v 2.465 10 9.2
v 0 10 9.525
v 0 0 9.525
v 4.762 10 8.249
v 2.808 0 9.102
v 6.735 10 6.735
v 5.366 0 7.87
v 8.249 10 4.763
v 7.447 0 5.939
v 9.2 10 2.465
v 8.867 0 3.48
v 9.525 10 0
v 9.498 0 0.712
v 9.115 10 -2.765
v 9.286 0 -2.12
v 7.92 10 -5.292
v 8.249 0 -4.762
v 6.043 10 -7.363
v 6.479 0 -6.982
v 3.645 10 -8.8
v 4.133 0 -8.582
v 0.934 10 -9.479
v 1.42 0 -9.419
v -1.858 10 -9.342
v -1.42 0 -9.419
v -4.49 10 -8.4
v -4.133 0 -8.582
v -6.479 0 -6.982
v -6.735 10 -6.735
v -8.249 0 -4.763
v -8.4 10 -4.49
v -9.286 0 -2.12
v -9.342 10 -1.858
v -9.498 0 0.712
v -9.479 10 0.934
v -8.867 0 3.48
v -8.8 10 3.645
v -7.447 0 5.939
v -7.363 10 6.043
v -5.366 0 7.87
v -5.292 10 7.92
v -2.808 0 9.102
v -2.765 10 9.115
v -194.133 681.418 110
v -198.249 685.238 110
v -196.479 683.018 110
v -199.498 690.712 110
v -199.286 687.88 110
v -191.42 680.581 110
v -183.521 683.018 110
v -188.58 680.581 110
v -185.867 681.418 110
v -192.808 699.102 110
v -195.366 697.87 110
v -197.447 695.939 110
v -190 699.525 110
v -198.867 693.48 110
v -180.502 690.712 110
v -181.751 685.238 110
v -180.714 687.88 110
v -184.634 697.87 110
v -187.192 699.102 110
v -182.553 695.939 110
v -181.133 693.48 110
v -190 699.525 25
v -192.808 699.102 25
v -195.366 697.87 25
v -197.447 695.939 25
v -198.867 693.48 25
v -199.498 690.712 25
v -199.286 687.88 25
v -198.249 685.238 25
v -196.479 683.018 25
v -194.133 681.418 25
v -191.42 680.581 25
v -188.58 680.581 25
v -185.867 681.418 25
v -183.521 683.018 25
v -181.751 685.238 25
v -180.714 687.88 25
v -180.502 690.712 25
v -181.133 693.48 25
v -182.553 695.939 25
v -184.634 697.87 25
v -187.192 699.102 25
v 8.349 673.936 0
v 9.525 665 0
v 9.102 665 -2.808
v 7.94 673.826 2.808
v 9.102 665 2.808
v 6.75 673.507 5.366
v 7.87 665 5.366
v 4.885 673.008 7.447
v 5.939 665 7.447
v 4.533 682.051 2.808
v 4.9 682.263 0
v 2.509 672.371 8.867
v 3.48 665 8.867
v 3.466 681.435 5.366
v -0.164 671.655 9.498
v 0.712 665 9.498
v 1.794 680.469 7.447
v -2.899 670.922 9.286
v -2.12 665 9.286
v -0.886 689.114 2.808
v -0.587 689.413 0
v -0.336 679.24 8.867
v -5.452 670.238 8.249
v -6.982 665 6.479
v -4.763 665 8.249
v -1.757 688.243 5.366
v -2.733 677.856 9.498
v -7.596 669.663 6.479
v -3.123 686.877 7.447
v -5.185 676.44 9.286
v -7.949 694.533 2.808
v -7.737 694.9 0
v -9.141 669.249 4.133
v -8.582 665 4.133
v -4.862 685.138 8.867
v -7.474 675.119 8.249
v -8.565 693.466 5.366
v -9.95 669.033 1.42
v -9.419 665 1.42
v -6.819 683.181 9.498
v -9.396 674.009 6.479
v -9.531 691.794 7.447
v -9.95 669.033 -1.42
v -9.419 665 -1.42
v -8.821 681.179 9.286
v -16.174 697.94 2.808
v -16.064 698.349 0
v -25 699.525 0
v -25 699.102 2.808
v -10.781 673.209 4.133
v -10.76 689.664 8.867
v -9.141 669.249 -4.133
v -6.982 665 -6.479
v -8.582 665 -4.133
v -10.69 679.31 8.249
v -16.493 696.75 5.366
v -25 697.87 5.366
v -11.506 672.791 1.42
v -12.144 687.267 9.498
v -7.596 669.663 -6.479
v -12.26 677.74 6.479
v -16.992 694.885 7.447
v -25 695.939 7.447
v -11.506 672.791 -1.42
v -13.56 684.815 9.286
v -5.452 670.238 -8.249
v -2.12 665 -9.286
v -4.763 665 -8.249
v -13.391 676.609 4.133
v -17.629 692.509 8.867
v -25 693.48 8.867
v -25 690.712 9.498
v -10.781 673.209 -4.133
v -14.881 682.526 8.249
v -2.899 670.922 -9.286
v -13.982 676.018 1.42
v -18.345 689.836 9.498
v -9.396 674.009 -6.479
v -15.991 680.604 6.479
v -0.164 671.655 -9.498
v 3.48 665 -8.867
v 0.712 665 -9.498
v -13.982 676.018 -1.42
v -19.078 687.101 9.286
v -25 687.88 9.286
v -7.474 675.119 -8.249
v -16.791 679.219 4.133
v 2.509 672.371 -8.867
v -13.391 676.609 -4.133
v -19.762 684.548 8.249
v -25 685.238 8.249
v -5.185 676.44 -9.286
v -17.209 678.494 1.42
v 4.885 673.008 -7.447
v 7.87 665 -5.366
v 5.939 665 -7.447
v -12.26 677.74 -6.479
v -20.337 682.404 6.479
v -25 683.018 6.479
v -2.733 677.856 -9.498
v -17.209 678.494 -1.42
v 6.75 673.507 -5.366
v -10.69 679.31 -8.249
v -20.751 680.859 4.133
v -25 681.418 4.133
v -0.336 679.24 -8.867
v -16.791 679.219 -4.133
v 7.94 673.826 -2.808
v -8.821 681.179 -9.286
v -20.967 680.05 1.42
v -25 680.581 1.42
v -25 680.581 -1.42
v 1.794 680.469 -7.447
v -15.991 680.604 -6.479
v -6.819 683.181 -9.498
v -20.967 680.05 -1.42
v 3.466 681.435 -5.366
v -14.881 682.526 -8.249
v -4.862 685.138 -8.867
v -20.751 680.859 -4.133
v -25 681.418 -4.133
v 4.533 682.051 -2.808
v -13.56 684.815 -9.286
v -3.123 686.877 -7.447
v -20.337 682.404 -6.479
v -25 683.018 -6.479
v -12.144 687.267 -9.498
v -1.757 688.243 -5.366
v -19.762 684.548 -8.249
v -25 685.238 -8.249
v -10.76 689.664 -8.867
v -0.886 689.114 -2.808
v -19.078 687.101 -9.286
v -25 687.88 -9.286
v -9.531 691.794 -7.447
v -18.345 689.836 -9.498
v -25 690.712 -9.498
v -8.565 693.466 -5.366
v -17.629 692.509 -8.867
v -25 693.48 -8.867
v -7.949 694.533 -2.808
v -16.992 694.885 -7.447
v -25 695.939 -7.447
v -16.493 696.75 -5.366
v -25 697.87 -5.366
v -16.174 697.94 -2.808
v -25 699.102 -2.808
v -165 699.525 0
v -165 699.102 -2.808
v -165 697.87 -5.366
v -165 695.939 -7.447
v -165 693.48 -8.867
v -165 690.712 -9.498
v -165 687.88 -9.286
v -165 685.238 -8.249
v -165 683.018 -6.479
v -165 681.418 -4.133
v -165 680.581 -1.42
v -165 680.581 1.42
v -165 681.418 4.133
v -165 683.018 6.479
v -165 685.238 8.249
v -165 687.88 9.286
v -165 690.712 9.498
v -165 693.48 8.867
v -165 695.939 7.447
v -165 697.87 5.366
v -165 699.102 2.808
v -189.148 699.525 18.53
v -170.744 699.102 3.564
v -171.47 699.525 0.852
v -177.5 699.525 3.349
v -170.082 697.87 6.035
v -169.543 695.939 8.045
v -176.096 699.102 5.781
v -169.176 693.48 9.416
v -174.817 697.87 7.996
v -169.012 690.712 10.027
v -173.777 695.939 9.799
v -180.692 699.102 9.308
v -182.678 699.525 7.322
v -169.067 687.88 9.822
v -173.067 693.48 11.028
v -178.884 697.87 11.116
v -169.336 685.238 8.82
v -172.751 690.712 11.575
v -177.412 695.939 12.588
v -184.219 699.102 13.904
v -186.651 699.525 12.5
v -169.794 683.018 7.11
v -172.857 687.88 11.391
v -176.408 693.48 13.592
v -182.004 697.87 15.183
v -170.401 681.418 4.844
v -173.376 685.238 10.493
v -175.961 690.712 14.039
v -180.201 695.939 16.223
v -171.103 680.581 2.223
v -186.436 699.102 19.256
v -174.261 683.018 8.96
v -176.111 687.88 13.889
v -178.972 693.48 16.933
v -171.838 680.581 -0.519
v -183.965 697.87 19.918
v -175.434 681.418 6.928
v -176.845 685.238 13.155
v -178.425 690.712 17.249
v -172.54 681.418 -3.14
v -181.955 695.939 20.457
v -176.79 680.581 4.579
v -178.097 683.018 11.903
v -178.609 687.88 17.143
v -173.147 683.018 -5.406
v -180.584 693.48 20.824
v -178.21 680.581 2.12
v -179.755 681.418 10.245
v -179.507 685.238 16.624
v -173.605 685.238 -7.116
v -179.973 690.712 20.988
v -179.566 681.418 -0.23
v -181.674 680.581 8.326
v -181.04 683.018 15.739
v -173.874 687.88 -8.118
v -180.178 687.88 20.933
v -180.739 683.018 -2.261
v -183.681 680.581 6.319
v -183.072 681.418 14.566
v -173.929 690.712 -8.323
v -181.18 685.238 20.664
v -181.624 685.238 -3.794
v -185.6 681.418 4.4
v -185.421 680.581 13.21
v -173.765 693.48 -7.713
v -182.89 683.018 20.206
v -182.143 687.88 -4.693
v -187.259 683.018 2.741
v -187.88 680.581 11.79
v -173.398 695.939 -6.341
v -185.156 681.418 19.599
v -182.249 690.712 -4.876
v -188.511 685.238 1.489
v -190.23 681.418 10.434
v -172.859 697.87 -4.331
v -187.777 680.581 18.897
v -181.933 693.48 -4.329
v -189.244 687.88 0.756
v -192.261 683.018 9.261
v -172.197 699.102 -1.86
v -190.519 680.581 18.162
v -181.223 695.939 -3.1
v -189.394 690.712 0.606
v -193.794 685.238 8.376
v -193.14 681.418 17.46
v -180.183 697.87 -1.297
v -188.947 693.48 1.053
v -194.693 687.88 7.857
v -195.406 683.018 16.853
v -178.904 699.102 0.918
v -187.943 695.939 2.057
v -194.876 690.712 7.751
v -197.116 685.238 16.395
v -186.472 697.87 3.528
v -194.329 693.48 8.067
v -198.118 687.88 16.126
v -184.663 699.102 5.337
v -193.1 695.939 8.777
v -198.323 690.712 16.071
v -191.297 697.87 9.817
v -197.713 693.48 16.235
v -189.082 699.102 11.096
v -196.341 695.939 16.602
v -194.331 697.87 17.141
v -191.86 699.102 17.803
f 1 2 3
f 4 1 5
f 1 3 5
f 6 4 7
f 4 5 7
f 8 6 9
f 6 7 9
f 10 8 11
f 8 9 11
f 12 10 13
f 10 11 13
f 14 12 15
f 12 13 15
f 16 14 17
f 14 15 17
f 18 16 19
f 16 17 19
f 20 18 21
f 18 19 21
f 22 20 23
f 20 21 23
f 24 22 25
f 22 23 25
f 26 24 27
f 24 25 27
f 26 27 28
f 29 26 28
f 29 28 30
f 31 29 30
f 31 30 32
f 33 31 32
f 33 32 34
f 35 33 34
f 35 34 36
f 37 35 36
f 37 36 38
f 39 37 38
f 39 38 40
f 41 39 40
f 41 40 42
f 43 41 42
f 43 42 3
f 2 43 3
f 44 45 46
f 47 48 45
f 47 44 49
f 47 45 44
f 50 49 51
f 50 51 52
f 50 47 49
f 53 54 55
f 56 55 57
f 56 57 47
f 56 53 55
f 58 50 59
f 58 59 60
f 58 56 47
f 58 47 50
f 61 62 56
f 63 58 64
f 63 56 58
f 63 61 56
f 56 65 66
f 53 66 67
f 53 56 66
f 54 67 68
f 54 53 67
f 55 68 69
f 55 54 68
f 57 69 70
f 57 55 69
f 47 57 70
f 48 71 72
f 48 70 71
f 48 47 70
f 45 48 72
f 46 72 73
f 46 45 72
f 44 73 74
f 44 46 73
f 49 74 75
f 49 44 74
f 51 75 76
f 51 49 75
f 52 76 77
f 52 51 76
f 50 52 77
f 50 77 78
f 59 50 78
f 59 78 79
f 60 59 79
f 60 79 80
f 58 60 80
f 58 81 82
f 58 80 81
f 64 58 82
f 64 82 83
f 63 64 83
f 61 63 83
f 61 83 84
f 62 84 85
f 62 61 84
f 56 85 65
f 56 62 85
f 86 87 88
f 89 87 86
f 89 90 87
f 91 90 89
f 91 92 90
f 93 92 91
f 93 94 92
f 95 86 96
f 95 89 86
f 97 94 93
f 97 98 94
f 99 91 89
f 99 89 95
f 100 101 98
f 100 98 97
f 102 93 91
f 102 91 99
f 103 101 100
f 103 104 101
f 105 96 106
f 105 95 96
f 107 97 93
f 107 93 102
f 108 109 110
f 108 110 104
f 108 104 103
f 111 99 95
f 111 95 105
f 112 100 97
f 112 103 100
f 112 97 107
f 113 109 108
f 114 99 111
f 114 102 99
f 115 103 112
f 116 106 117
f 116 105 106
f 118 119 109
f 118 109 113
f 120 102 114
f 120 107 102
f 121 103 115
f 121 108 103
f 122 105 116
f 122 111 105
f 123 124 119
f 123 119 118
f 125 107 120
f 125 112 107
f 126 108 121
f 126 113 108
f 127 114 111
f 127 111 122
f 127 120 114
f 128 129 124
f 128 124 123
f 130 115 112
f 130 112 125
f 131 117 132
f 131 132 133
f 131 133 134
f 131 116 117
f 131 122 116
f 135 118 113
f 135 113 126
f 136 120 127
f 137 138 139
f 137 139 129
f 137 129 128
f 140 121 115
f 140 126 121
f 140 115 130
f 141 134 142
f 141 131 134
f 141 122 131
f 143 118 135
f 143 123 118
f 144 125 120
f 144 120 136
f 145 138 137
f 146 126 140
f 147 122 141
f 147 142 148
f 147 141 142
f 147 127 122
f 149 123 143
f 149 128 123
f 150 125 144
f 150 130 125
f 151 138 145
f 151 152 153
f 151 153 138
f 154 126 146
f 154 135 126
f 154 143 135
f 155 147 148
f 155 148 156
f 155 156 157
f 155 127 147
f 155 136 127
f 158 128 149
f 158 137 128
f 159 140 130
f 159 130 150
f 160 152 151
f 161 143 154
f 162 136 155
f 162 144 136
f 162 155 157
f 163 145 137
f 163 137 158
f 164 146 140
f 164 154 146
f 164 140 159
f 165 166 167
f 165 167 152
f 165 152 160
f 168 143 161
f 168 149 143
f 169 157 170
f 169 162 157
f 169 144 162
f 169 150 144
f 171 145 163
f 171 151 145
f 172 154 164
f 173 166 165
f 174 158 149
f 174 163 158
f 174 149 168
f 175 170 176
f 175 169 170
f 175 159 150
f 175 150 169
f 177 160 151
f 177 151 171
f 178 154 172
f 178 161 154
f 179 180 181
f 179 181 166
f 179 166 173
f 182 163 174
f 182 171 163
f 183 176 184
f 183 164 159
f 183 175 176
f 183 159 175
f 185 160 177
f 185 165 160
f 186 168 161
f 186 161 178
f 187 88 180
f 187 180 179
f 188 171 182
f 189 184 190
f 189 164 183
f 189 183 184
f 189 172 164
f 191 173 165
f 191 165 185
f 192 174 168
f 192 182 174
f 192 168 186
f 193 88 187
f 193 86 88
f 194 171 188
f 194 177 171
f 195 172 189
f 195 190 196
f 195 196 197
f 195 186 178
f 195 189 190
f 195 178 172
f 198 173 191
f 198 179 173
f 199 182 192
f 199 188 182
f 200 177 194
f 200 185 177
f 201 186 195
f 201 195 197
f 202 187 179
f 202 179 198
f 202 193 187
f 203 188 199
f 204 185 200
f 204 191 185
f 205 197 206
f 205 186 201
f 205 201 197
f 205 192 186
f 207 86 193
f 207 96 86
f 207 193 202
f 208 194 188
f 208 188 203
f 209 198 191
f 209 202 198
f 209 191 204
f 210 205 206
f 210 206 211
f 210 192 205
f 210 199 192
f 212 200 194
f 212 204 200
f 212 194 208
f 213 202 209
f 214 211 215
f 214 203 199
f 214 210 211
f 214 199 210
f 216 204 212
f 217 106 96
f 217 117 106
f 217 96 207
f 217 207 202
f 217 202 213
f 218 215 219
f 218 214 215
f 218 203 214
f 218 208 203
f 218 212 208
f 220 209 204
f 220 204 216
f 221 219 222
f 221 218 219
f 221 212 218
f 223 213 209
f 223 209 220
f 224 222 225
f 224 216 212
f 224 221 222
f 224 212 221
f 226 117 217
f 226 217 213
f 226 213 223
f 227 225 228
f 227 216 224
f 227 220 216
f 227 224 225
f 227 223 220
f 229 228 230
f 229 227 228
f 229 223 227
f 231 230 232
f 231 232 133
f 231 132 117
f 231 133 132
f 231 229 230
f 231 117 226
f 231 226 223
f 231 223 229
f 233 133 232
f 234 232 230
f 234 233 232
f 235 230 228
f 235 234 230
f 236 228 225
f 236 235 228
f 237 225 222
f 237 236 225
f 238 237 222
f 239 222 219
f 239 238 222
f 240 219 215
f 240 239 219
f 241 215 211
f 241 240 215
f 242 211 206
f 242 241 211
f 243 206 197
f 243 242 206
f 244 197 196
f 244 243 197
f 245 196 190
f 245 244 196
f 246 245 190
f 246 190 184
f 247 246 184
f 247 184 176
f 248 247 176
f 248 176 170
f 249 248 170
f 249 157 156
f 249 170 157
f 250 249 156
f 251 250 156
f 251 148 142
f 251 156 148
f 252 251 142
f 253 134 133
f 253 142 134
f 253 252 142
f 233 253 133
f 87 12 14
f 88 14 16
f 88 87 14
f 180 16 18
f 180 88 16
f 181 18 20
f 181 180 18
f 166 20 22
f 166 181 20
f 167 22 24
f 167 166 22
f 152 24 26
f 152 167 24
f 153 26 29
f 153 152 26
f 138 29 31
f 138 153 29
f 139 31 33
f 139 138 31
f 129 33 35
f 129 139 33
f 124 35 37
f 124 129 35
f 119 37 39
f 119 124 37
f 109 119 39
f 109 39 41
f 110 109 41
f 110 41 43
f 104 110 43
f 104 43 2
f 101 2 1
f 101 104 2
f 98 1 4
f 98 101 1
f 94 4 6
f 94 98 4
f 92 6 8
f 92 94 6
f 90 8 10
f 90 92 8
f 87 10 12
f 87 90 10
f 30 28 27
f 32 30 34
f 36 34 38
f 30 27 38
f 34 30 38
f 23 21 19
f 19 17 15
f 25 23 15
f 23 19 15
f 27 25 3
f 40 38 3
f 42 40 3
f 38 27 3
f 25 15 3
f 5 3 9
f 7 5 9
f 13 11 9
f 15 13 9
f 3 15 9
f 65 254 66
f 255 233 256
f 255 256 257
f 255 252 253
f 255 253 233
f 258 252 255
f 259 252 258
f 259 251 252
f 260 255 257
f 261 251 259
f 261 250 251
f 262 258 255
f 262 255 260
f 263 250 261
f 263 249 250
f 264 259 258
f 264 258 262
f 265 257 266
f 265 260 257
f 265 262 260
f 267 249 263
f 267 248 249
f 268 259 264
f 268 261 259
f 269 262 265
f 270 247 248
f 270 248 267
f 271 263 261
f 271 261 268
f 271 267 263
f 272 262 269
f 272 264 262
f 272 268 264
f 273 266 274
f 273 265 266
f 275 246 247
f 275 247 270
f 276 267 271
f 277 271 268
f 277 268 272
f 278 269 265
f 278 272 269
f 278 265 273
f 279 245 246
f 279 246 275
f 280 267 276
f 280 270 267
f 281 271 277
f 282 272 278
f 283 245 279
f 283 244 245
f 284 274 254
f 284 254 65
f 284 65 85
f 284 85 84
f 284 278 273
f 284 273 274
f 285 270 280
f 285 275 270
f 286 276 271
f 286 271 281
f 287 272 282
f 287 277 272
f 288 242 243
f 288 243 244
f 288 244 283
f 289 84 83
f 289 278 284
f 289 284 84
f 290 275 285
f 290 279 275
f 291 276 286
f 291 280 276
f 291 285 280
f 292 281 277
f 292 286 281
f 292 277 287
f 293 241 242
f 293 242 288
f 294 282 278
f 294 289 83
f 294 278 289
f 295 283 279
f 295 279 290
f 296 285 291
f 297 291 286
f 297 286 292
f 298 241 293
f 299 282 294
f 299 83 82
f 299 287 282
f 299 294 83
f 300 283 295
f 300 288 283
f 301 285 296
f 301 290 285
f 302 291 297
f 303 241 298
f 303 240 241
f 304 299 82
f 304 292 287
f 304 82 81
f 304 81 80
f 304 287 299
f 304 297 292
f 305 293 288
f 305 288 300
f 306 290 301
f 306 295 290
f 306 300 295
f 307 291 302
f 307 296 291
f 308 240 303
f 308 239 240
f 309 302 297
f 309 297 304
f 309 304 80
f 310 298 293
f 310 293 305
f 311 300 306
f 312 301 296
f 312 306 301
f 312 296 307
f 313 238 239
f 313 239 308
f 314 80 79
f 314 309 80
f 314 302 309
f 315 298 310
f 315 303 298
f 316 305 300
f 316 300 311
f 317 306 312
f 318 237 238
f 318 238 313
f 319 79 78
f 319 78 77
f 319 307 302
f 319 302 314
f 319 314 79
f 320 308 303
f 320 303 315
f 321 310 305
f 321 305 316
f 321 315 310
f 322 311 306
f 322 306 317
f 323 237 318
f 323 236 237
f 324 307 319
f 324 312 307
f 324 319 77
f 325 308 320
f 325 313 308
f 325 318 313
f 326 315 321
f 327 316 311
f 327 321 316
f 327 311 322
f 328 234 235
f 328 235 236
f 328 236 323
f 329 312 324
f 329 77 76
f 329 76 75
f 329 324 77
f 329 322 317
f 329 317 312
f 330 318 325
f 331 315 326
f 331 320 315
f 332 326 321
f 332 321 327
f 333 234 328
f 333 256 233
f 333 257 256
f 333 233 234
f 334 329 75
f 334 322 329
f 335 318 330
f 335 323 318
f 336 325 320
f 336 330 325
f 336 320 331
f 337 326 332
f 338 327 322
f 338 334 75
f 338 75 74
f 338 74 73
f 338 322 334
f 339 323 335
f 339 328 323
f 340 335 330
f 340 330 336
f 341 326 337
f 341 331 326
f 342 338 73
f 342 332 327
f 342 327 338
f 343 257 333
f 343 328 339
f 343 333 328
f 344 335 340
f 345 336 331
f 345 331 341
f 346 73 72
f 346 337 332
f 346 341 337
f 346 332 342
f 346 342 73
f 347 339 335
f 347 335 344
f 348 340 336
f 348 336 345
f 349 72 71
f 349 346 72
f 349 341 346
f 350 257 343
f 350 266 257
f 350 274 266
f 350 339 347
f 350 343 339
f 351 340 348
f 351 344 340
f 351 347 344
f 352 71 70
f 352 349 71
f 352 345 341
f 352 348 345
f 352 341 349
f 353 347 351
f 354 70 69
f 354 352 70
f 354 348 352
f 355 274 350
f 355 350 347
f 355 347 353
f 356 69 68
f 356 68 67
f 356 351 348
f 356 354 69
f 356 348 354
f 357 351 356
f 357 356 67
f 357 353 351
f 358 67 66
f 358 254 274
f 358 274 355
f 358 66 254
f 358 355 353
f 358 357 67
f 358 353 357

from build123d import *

# Parameters (mm, degrees)
CROQUIS1_R              = 9.525
SALIENTE_EXTRUIR1_DEPTH = 10
CROQUIS2_R              = 9.525


with BuildPart() as part:
    # Croquis1 → Saliente-Extruir1 (new body)
    with BuildSketch(Plane(origin=(0, 0, 0), x_dir=(1, 0, 0), z_dir=(0, 1, 0))):
        with Locations(Location((0, 0, 0), (0, 0, 270))):
            Circle(CROQUIS1_R)
    extrude(amount=SALIENTE_EXTRUIR1_DEPTH)

    # Barrer1: sweep along a curve in space
    with BuildLine() as barrer1_path:
        Line((0, 10, 0), (0, 665, 0))
        ThreePointArc((0, 665, 0), (-7.32233047, 682.67766953, 0), (-25, 690, 0))
        Line((-25, 690, 0), (-165, 690, 0))
        ThreePointArc((-165, 690, 0), (-182.67766953, 690, 7.32233047), (-190, 690, 25))
        Line((-190, 690, 25), (-190, 690, 110))
    # Croquis2 → Barrer1 (sweep)
    with BuildSketch(Plane(origin=(0, 10, 0), x_dir=(1, 0, 0), z_dir=(0, 1, 0))):
        Circle(CROQUIS2_R)
    sweep(path=barrer1_path.line)


solid = part.part
